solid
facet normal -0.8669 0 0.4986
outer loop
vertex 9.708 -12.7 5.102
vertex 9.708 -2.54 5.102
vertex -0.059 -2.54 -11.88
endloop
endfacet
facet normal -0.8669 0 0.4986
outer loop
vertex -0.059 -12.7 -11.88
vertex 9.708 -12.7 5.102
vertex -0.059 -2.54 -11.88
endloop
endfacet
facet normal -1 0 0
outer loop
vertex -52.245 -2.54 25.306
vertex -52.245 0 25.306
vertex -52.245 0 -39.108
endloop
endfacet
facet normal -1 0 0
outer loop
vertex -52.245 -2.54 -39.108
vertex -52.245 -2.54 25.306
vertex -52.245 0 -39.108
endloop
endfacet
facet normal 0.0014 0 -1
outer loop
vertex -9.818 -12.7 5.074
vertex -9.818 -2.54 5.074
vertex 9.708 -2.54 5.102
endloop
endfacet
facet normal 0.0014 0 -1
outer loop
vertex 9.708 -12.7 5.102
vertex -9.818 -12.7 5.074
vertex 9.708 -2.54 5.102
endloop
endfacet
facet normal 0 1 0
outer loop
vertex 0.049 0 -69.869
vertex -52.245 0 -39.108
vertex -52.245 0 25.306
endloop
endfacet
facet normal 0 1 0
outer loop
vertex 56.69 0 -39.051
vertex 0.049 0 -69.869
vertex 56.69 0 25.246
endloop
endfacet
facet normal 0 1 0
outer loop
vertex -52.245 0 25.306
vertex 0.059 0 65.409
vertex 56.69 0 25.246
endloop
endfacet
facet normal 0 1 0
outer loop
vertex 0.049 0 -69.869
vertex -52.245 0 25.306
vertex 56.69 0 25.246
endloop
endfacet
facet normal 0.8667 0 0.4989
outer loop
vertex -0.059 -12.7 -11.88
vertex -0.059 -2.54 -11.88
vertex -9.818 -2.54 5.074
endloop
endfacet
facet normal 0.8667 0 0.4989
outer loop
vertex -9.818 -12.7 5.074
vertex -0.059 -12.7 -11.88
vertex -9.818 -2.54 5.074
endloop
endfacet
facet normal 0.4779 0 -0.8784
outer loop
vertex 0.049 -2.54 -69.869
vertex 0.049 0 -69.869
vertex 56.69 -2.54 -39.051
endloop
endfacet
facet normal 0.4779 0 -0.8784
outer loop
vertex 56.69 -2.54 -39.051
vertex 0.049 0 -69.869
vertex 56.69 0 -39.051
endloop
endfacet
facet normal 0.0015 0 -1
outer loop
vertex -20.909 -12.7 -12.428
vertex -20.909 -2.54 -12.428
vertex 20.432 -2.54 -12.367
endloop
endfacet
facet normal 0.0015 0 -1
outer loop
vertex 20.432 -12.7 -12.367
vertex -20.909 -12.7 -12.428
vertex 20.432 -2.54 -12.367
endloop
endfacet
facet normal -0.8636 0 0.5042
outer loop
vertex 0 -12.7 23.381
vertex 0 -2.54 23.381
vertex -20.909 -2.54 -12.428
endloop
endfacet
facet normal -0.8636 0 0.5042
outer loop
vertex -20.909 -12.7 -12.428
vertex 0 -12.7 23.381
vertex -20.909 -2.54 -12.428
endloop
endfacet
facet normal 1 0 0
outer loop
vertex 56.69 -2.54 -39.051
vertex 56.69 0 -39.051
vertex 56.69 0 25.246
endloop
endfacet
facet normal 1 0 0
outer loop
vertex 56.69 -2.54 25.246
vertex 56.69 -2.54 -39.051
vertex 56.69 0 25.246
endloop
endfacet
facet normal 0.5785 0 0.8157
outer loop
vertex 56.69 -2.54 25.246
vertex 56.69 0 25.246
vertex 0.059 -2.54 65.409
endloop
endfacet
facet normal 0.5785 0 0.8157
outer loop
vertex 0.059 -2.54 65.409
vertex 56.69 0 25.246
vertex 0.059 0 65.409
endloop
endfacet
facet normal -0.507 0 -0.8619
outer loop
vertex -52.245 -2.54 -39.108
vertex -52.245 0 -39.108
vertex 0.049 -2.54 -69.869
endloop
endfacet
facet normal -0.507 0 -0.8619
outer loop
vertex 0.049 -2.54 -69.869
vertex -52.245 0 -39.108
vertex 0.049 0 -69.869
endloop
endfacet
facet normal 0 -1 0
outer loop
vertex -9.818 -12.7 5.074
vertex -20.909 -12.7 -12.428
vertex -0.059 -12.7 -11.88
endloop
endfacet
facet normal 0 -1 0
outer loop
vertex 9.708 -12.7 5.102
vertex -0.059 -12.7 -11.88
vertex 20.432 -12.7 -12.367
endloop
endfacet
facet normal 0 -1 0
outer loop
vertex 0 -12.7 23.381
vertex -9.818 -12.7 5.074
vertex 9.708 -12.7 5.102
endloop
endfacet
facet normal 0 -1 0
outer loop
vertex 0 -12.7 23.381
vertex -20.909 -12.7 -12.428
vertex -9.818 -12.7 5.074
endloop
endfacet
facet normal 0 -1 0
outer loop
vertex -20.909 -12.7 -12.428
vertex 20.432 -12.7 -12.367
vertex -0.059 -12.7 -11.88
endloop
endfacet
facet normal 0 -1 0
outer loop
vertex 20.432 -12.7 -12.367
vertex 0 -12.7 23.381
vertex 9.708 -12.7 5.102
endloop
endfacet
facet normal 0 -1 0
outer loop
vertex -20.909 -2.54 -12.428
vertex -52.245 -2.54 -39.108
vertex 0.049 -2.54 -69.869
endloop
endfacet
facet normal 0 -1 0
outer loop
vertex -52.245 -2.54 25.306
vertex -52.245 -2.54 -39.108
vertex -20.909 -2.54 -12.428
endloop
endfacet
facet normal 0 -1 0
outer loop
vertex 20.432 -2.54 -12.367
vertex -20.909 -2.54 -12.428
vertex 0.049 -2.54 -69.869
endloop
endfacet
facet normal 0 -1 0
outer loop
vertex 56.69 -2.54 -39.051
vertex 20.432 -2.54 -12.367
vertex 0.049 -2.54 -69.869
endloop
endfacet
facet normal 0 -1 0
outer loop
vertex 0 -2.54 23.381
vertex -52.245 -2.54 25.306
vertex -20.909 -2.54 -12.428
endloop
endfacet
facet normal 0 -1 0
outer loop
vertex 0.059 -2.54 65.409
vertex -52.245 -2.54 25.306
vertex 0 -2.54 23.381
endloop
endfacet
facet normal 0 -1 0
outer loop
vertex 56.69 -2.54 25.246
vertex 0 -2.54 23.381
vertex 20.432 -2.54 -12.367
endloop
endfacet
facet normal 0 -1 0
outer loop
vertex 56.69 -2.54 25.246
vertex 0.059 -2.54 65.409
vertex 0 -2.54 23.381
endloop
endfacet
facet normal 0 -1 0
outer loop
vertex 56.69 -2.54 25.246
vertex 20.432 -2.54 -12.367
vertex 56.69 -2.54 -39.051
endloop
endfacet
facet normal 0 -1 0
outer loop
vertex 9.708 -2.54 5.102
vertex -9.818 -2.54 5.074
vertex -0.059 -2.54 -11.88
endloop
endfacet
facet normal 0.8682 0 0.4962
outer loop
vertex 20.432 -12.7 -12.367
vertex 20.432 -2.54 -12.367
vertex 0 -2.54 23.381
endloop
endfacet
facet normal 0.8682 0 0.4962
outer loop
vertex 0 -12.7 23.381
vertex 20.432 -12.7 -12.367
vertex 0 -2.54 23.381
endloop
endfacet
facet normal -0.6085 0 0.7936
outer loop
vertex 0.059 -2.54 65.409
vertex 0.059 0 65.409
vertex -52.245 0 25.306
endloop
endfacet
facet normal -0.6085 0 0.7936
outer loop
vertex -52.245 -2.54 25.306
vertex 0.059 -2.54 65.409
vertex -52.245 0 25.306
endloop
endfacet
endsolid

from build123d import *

# Parameters (mm, degrees)
F1_DEPTH  = 12.7
F2_DEPTH  = 2.54
F3_DEPTH  = 7.62
F4_DEPTH  = 2.54
F5_DEPTH  = 2.54
F6_DEPTH  = 2.54
F7_DEPTH  = 2.54
F8_DEPTH  = 2.54
F9_DEPTH  = 2.54
F11_DEPTH = 10.16


with BuildPart() as f1:
    # F0 (on Front) → F1 (new body)
    with BuildSketch(Plane.XZ):
        Polygon((59.2296272516, 26.558874175), (0, 68.5641244054), (-54.7846257687, 26.558874175), (-54.7846257687, -40.5606217682), (0, -72.7868750691), (59.2296272516, -40.5606217682), align=None)
    extrude(amount=F1_DEPTH)

    # F2 (cut): a face of the model
    f2_faces = [f1.faces().sort_by_distance(p)[0] for p in [
        (1.9587071028, -12.7, -4.2659517496),
    ]]
    extrude(f2_faces, amount=-F2_DEPTH, mode=Mode.SUBTRACT)

    # F3 (cut): a face of the model
    f3_faces = [f1.faces().sort_by_distance(p)[0] for p in [
        (1.9587071028, -10.16, -4.2659517496),
    ]]
    extrude(f3_faces, amount=-F3_DEPTH, mode=Mode.SUBTRACT)

    # F4 (cut): a face of the model
    f4_faces = [f1.faces().sort_by_distance(p)[0] for p in [
        (29.6148136258, -1.27, 47.5614992902),
    ]]
    extrude(f4_faces, amount=-F4_DEPTH, mode=Mode.SUBTRACT)

    # F5 (cut): a face of the model
    f5_faces = [f1.faces().sort_by_distance(p)[0] for p in [
        (-27.3923128843, -1.27, 47.5614992902),
    ]]
    extrude(f5_faces, amount=-F5_DEPTH, mode=Mode.SUBTRACT)

    # F6 (cut): a face of the model
    f6_faces = [f1.faces().sort_by_distance(p)[0] for p in [
        (59.2296272516, -1.27, -7.0008737966),
    ]]
    extrude(f6_faces, amount=-F6_DEPTH, mode=Mode.SUBTRACT)

    # F7 (cut): a face of the model
    f7_faces = [f1.faces().sort_by_distance(p)[0] for p in [
        (-54.7846257687, -1.27, -7.0008737966),
    ]]
    extrude(f7_faces, amount=-F7_DEPTH, mode=Mode.SUBTRACT)

    # F8 (cut): a face of the model
    f8_faces = [f1.faces().sort_by_distance(p)[0] for p in [
        (-27.3923128843, -1.27, -56.6737484187),
    ]]
    extrude(f8_faces, amount=-F8_DEPTH, mode=Mode.SUBTRACT)

    # F9 (cut): a face of the model
    f9_faces = [f1.faces().sort_by_distance(p)[0] for p in [
        (29.6148136258, -1.27, -56.6737484187),
    ]]
    extrude(f9_faces, amount=-F9_DEPTH, mode=Mode.SUBTRACT)

    # F10 (on face) → F11 (join)
    with BuildSketch(Plane.XZ.offset(2.54)):
        Polygon((0, 23.3808644116), (-20.9086928517, -12.427886948), (20.4324796796, -12.3670902103), align=None)
        Polygon((-0.0592354809, -11.8803661317), (-9.8176104948, 5.073542241), (9.7081990615, 5.1022570899), align=None, mode=Mode.SUBTRACT)
    extrude(amount=F11_DEPTH)


solid = f1.part
